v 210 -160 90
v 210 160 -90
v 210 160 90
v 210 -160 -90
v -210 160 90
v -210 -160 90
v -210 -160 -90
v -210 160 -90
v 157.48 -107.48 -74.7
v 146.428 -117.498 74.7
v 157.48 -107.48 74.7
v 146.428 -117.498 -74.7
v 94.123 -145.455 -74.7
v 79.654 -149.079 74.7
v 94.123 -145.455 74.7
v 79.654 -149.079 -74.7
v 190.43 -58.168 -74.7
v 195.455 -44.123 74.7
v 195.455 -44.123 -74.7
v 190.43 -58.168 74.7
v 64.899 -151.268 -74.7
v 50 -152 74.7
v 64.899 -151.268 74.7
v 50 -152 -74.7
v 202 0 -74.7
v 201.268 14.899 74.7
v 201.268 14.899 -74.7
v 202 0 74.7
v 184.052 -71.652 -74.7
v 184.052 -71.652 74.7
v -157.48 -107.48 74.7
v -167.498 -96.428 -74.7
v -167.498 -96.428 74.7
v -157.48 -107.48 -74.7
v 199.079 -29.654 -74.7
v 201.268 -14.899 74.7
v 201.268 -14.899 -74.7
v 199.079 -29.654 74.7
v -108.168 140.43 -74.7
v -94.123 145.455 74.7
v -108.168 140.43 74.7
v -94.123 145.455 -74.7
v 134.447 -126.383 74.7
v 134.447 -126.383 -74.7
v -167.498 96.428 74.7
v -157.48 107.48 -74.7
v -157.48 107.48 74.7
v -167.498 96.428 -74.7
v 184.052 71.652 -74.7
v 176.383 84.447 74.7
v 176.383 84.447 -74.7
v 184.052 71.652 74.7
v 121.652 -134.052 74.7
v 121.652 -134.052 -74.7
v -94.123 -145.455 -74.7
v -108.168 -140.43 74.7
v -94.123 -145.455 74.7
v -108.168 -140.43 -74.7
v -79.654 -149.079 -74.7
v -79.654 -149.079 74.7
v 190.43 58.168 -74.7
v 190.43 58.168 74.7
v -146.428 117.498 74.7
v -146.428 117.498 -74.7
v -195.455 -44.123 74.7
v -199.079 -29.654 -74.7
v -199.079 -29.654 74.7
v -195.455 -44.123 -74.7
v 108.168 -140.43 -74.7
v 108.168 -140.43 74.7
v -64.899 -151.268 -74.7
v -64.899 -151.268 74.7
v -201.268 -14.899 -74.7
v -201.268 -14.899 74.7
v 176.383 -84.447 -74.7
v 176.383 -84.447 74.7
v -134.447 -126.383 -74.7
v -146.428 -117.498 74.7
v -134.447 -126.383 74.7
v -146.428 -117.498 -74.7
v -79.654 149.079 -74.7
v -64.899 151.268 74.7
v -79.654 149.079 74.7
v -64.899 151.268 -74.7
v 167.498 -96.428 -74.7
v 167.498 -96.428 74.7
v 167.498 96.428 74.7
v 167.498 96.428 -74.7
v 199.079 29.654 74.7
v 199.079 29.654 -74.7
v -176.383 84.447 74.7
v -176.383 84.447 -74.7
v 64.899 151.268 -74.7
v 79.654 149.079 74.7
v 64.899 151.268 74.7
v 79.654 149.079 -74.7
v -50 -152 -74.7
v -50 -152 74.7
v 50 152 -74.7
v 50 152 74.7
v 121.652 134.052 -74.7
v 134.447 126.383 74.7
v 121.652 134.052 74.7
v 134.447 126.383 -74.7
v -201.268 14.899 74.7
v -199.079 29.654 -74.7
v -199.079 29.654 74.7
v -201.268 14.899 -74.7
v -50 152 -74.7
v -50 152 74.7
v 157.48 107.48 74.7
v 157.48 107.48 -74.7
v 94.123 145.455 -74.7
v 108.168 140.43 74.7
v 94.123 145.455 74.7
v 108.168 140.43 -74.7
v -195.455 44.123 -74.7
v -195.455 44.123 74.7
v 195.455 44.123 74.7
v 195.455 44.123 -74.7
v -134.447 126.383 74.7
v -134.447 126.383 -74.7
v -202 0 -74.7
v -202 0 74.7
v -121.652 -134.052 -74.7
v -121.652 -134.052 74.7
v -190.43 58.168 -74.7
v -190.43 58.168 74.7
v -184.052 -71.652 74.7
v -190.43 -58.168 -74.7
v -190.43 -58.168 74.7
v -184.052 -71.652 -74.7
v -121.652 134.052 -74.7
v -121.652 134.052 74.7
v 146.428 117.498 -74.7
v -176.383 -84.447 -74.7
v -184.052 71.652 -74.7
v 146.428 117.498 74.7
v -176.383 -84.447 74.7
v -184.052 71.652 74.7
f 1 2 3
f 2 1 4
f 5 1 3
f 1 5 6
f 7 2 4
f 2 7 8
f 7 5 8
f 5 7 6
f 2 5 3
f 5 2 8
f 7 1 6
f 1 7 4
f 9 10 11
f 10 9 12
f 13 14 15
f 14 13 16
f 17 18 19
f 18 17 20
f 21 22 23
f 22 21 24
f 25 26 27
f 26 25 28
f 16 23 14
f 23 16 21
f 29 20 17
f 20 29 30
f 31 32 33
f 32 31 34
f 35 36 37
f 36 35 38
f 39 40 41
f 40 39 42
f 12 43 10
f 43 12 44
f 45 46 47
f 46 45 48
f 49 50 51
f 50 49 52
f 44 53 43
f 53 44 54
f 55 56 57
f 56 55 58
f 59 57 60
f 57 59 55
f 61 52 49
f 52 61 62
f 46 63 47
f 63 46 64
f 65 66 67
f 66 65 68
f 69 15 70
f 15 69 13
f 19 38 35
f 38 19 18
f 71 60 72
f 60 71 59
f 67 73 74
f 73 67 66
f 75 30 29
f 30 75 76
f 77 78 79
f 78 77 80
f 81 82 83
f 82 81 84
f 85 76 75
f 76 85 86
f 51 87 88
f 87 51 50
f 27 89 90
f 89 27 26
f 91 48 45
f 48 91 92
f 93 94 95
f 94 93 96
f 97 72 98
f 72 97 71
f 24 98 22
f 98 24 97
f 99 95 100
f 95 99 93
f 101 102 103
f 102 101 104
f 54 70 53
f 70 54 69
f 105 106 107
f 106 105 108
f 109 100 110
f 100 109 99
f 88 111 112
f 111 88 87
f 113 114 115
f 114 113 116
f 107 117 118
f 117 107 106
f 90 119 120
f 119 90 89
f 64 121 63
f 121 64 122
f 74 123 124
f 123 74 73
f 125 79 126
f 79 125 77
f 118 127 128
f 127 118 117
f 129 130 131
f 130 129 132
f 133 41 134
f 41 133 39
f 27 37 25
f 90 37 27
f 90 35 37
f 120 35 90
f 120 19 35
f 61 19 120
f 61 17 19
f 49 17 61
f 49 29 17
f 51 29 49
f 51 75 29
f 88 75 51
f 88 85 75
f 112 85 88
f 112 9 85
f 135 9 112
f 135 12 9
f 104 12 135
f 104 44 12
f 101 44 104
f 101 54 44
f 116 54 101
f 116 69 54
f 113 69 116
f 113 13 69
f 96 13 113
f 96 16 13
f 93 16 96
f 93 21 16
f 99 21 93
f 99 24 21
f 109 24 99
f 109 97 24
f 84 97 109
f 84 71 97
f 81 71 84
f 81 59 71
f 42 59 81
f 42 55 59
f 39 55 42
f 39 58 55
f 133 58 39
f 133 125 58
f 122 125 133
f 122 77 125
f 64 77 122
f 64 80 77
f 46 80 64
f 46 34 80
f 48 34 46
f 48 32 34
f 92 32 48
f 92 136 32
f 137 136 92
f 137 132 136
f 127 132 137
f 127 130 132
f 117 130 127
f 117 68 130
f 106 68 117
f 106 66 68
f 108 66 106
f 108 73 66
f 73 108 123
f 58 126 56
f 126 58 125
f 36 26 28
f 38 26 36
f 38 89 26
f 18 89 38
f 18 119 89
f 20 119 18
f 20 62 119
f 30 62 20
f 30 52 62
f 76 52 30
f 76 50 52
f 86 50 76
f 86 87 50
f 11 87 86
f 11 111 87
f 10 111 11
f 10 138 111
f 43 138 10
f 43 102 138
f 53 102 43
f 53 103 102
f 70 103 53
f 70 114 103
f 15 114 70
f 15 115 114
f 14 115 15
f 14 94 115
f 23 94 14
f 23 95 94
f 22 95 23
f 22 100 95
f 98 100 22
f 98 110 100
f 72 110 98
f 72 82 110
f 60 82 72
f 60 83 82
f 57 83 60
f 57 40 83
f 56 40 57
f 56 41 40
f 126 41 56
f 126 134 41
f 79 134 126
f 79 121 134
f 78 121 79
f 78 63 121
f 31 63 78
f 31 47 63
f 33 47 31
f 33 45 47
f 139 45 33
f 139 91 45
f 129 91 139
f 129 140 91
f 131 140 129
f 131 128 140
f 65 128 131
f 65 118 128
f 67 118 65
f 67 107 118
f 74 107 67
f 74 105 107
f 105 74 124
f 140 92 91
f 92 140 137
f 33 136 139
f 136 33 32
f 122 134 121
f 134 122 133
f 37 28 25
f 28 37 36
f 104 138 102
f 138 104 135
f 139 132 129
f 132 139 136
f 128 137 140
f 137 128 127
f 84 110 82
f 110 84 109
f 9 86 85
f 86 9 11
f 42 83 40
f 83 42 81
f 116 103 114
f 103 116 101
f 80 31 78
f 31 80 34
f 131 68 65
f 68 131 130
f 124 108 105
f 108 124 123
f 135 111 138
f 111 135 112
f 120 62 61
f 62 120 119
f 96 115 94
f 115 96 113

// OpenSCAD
// ============================================================================
// Atom Lithography Machine — Parametric OpenSCAD Module (S9.3-02)
// ============================================================================
// part_id           : S9.3-02
// parent_bom_id     : S9.3
// subsystem         : S9
// part_name         : Yedek 4 K kriyo-LNA ve izolator saha servis kiti (4 zincir)
// material          : OFHC Cu
// temp_stage        : 4 K / 20 mK
// vacuum_grade      : Kriyo-vakum
// tolerance         : P_DC <= 2.8 mW
// computed_mass_kg  : 9.20000
// envelope_mm       : 448.800 x 336.400 x 180.000
// design_maturity   : M0_M1_DETAILED_CAD_DESIGN_ONLY
// no_lab_measurement: true
// iec61508_certified: false
// semi_s2_certified : false
// Units: millimeters (mm)
// ============================================================================

$fn = 64;

// Nominal bounding envelope parameters (mm)
bbox_x = 448.8000;
bbox_y = 336.4000;
bbox_z = 180.0000;

// Part-specific parametric dimensions
qty_chains = 4;
case_dx_mm = 420.0;
case_dy_mm = 320.0;
case_dz_mm = 180.0;

// Interface / port parameters (mm)

module part_S9_3_02() {
  difference() {
    union() {
      // Cleanroom ESD storage case outer envelope
      cube([420.000, 320.000, 180.000], center=true);
    }
    // Internal padded kit tray cavity
    hull() {
      translate([-50.000, 0, 0]) cylinder(d=304.000, h=149.400, center=true);
      translate([50.000, 0, 0]) cylinder(d=304.000, h=149.400, center=true);
    }
  }
}

// World assembly mounting transform (global machine frame, mm / deg):
// translate([280.000, -1520.000, 90.000]) rotate([0.000, 0.000, 0.000]) part_S9_3_02();

part_S9_3_02();
